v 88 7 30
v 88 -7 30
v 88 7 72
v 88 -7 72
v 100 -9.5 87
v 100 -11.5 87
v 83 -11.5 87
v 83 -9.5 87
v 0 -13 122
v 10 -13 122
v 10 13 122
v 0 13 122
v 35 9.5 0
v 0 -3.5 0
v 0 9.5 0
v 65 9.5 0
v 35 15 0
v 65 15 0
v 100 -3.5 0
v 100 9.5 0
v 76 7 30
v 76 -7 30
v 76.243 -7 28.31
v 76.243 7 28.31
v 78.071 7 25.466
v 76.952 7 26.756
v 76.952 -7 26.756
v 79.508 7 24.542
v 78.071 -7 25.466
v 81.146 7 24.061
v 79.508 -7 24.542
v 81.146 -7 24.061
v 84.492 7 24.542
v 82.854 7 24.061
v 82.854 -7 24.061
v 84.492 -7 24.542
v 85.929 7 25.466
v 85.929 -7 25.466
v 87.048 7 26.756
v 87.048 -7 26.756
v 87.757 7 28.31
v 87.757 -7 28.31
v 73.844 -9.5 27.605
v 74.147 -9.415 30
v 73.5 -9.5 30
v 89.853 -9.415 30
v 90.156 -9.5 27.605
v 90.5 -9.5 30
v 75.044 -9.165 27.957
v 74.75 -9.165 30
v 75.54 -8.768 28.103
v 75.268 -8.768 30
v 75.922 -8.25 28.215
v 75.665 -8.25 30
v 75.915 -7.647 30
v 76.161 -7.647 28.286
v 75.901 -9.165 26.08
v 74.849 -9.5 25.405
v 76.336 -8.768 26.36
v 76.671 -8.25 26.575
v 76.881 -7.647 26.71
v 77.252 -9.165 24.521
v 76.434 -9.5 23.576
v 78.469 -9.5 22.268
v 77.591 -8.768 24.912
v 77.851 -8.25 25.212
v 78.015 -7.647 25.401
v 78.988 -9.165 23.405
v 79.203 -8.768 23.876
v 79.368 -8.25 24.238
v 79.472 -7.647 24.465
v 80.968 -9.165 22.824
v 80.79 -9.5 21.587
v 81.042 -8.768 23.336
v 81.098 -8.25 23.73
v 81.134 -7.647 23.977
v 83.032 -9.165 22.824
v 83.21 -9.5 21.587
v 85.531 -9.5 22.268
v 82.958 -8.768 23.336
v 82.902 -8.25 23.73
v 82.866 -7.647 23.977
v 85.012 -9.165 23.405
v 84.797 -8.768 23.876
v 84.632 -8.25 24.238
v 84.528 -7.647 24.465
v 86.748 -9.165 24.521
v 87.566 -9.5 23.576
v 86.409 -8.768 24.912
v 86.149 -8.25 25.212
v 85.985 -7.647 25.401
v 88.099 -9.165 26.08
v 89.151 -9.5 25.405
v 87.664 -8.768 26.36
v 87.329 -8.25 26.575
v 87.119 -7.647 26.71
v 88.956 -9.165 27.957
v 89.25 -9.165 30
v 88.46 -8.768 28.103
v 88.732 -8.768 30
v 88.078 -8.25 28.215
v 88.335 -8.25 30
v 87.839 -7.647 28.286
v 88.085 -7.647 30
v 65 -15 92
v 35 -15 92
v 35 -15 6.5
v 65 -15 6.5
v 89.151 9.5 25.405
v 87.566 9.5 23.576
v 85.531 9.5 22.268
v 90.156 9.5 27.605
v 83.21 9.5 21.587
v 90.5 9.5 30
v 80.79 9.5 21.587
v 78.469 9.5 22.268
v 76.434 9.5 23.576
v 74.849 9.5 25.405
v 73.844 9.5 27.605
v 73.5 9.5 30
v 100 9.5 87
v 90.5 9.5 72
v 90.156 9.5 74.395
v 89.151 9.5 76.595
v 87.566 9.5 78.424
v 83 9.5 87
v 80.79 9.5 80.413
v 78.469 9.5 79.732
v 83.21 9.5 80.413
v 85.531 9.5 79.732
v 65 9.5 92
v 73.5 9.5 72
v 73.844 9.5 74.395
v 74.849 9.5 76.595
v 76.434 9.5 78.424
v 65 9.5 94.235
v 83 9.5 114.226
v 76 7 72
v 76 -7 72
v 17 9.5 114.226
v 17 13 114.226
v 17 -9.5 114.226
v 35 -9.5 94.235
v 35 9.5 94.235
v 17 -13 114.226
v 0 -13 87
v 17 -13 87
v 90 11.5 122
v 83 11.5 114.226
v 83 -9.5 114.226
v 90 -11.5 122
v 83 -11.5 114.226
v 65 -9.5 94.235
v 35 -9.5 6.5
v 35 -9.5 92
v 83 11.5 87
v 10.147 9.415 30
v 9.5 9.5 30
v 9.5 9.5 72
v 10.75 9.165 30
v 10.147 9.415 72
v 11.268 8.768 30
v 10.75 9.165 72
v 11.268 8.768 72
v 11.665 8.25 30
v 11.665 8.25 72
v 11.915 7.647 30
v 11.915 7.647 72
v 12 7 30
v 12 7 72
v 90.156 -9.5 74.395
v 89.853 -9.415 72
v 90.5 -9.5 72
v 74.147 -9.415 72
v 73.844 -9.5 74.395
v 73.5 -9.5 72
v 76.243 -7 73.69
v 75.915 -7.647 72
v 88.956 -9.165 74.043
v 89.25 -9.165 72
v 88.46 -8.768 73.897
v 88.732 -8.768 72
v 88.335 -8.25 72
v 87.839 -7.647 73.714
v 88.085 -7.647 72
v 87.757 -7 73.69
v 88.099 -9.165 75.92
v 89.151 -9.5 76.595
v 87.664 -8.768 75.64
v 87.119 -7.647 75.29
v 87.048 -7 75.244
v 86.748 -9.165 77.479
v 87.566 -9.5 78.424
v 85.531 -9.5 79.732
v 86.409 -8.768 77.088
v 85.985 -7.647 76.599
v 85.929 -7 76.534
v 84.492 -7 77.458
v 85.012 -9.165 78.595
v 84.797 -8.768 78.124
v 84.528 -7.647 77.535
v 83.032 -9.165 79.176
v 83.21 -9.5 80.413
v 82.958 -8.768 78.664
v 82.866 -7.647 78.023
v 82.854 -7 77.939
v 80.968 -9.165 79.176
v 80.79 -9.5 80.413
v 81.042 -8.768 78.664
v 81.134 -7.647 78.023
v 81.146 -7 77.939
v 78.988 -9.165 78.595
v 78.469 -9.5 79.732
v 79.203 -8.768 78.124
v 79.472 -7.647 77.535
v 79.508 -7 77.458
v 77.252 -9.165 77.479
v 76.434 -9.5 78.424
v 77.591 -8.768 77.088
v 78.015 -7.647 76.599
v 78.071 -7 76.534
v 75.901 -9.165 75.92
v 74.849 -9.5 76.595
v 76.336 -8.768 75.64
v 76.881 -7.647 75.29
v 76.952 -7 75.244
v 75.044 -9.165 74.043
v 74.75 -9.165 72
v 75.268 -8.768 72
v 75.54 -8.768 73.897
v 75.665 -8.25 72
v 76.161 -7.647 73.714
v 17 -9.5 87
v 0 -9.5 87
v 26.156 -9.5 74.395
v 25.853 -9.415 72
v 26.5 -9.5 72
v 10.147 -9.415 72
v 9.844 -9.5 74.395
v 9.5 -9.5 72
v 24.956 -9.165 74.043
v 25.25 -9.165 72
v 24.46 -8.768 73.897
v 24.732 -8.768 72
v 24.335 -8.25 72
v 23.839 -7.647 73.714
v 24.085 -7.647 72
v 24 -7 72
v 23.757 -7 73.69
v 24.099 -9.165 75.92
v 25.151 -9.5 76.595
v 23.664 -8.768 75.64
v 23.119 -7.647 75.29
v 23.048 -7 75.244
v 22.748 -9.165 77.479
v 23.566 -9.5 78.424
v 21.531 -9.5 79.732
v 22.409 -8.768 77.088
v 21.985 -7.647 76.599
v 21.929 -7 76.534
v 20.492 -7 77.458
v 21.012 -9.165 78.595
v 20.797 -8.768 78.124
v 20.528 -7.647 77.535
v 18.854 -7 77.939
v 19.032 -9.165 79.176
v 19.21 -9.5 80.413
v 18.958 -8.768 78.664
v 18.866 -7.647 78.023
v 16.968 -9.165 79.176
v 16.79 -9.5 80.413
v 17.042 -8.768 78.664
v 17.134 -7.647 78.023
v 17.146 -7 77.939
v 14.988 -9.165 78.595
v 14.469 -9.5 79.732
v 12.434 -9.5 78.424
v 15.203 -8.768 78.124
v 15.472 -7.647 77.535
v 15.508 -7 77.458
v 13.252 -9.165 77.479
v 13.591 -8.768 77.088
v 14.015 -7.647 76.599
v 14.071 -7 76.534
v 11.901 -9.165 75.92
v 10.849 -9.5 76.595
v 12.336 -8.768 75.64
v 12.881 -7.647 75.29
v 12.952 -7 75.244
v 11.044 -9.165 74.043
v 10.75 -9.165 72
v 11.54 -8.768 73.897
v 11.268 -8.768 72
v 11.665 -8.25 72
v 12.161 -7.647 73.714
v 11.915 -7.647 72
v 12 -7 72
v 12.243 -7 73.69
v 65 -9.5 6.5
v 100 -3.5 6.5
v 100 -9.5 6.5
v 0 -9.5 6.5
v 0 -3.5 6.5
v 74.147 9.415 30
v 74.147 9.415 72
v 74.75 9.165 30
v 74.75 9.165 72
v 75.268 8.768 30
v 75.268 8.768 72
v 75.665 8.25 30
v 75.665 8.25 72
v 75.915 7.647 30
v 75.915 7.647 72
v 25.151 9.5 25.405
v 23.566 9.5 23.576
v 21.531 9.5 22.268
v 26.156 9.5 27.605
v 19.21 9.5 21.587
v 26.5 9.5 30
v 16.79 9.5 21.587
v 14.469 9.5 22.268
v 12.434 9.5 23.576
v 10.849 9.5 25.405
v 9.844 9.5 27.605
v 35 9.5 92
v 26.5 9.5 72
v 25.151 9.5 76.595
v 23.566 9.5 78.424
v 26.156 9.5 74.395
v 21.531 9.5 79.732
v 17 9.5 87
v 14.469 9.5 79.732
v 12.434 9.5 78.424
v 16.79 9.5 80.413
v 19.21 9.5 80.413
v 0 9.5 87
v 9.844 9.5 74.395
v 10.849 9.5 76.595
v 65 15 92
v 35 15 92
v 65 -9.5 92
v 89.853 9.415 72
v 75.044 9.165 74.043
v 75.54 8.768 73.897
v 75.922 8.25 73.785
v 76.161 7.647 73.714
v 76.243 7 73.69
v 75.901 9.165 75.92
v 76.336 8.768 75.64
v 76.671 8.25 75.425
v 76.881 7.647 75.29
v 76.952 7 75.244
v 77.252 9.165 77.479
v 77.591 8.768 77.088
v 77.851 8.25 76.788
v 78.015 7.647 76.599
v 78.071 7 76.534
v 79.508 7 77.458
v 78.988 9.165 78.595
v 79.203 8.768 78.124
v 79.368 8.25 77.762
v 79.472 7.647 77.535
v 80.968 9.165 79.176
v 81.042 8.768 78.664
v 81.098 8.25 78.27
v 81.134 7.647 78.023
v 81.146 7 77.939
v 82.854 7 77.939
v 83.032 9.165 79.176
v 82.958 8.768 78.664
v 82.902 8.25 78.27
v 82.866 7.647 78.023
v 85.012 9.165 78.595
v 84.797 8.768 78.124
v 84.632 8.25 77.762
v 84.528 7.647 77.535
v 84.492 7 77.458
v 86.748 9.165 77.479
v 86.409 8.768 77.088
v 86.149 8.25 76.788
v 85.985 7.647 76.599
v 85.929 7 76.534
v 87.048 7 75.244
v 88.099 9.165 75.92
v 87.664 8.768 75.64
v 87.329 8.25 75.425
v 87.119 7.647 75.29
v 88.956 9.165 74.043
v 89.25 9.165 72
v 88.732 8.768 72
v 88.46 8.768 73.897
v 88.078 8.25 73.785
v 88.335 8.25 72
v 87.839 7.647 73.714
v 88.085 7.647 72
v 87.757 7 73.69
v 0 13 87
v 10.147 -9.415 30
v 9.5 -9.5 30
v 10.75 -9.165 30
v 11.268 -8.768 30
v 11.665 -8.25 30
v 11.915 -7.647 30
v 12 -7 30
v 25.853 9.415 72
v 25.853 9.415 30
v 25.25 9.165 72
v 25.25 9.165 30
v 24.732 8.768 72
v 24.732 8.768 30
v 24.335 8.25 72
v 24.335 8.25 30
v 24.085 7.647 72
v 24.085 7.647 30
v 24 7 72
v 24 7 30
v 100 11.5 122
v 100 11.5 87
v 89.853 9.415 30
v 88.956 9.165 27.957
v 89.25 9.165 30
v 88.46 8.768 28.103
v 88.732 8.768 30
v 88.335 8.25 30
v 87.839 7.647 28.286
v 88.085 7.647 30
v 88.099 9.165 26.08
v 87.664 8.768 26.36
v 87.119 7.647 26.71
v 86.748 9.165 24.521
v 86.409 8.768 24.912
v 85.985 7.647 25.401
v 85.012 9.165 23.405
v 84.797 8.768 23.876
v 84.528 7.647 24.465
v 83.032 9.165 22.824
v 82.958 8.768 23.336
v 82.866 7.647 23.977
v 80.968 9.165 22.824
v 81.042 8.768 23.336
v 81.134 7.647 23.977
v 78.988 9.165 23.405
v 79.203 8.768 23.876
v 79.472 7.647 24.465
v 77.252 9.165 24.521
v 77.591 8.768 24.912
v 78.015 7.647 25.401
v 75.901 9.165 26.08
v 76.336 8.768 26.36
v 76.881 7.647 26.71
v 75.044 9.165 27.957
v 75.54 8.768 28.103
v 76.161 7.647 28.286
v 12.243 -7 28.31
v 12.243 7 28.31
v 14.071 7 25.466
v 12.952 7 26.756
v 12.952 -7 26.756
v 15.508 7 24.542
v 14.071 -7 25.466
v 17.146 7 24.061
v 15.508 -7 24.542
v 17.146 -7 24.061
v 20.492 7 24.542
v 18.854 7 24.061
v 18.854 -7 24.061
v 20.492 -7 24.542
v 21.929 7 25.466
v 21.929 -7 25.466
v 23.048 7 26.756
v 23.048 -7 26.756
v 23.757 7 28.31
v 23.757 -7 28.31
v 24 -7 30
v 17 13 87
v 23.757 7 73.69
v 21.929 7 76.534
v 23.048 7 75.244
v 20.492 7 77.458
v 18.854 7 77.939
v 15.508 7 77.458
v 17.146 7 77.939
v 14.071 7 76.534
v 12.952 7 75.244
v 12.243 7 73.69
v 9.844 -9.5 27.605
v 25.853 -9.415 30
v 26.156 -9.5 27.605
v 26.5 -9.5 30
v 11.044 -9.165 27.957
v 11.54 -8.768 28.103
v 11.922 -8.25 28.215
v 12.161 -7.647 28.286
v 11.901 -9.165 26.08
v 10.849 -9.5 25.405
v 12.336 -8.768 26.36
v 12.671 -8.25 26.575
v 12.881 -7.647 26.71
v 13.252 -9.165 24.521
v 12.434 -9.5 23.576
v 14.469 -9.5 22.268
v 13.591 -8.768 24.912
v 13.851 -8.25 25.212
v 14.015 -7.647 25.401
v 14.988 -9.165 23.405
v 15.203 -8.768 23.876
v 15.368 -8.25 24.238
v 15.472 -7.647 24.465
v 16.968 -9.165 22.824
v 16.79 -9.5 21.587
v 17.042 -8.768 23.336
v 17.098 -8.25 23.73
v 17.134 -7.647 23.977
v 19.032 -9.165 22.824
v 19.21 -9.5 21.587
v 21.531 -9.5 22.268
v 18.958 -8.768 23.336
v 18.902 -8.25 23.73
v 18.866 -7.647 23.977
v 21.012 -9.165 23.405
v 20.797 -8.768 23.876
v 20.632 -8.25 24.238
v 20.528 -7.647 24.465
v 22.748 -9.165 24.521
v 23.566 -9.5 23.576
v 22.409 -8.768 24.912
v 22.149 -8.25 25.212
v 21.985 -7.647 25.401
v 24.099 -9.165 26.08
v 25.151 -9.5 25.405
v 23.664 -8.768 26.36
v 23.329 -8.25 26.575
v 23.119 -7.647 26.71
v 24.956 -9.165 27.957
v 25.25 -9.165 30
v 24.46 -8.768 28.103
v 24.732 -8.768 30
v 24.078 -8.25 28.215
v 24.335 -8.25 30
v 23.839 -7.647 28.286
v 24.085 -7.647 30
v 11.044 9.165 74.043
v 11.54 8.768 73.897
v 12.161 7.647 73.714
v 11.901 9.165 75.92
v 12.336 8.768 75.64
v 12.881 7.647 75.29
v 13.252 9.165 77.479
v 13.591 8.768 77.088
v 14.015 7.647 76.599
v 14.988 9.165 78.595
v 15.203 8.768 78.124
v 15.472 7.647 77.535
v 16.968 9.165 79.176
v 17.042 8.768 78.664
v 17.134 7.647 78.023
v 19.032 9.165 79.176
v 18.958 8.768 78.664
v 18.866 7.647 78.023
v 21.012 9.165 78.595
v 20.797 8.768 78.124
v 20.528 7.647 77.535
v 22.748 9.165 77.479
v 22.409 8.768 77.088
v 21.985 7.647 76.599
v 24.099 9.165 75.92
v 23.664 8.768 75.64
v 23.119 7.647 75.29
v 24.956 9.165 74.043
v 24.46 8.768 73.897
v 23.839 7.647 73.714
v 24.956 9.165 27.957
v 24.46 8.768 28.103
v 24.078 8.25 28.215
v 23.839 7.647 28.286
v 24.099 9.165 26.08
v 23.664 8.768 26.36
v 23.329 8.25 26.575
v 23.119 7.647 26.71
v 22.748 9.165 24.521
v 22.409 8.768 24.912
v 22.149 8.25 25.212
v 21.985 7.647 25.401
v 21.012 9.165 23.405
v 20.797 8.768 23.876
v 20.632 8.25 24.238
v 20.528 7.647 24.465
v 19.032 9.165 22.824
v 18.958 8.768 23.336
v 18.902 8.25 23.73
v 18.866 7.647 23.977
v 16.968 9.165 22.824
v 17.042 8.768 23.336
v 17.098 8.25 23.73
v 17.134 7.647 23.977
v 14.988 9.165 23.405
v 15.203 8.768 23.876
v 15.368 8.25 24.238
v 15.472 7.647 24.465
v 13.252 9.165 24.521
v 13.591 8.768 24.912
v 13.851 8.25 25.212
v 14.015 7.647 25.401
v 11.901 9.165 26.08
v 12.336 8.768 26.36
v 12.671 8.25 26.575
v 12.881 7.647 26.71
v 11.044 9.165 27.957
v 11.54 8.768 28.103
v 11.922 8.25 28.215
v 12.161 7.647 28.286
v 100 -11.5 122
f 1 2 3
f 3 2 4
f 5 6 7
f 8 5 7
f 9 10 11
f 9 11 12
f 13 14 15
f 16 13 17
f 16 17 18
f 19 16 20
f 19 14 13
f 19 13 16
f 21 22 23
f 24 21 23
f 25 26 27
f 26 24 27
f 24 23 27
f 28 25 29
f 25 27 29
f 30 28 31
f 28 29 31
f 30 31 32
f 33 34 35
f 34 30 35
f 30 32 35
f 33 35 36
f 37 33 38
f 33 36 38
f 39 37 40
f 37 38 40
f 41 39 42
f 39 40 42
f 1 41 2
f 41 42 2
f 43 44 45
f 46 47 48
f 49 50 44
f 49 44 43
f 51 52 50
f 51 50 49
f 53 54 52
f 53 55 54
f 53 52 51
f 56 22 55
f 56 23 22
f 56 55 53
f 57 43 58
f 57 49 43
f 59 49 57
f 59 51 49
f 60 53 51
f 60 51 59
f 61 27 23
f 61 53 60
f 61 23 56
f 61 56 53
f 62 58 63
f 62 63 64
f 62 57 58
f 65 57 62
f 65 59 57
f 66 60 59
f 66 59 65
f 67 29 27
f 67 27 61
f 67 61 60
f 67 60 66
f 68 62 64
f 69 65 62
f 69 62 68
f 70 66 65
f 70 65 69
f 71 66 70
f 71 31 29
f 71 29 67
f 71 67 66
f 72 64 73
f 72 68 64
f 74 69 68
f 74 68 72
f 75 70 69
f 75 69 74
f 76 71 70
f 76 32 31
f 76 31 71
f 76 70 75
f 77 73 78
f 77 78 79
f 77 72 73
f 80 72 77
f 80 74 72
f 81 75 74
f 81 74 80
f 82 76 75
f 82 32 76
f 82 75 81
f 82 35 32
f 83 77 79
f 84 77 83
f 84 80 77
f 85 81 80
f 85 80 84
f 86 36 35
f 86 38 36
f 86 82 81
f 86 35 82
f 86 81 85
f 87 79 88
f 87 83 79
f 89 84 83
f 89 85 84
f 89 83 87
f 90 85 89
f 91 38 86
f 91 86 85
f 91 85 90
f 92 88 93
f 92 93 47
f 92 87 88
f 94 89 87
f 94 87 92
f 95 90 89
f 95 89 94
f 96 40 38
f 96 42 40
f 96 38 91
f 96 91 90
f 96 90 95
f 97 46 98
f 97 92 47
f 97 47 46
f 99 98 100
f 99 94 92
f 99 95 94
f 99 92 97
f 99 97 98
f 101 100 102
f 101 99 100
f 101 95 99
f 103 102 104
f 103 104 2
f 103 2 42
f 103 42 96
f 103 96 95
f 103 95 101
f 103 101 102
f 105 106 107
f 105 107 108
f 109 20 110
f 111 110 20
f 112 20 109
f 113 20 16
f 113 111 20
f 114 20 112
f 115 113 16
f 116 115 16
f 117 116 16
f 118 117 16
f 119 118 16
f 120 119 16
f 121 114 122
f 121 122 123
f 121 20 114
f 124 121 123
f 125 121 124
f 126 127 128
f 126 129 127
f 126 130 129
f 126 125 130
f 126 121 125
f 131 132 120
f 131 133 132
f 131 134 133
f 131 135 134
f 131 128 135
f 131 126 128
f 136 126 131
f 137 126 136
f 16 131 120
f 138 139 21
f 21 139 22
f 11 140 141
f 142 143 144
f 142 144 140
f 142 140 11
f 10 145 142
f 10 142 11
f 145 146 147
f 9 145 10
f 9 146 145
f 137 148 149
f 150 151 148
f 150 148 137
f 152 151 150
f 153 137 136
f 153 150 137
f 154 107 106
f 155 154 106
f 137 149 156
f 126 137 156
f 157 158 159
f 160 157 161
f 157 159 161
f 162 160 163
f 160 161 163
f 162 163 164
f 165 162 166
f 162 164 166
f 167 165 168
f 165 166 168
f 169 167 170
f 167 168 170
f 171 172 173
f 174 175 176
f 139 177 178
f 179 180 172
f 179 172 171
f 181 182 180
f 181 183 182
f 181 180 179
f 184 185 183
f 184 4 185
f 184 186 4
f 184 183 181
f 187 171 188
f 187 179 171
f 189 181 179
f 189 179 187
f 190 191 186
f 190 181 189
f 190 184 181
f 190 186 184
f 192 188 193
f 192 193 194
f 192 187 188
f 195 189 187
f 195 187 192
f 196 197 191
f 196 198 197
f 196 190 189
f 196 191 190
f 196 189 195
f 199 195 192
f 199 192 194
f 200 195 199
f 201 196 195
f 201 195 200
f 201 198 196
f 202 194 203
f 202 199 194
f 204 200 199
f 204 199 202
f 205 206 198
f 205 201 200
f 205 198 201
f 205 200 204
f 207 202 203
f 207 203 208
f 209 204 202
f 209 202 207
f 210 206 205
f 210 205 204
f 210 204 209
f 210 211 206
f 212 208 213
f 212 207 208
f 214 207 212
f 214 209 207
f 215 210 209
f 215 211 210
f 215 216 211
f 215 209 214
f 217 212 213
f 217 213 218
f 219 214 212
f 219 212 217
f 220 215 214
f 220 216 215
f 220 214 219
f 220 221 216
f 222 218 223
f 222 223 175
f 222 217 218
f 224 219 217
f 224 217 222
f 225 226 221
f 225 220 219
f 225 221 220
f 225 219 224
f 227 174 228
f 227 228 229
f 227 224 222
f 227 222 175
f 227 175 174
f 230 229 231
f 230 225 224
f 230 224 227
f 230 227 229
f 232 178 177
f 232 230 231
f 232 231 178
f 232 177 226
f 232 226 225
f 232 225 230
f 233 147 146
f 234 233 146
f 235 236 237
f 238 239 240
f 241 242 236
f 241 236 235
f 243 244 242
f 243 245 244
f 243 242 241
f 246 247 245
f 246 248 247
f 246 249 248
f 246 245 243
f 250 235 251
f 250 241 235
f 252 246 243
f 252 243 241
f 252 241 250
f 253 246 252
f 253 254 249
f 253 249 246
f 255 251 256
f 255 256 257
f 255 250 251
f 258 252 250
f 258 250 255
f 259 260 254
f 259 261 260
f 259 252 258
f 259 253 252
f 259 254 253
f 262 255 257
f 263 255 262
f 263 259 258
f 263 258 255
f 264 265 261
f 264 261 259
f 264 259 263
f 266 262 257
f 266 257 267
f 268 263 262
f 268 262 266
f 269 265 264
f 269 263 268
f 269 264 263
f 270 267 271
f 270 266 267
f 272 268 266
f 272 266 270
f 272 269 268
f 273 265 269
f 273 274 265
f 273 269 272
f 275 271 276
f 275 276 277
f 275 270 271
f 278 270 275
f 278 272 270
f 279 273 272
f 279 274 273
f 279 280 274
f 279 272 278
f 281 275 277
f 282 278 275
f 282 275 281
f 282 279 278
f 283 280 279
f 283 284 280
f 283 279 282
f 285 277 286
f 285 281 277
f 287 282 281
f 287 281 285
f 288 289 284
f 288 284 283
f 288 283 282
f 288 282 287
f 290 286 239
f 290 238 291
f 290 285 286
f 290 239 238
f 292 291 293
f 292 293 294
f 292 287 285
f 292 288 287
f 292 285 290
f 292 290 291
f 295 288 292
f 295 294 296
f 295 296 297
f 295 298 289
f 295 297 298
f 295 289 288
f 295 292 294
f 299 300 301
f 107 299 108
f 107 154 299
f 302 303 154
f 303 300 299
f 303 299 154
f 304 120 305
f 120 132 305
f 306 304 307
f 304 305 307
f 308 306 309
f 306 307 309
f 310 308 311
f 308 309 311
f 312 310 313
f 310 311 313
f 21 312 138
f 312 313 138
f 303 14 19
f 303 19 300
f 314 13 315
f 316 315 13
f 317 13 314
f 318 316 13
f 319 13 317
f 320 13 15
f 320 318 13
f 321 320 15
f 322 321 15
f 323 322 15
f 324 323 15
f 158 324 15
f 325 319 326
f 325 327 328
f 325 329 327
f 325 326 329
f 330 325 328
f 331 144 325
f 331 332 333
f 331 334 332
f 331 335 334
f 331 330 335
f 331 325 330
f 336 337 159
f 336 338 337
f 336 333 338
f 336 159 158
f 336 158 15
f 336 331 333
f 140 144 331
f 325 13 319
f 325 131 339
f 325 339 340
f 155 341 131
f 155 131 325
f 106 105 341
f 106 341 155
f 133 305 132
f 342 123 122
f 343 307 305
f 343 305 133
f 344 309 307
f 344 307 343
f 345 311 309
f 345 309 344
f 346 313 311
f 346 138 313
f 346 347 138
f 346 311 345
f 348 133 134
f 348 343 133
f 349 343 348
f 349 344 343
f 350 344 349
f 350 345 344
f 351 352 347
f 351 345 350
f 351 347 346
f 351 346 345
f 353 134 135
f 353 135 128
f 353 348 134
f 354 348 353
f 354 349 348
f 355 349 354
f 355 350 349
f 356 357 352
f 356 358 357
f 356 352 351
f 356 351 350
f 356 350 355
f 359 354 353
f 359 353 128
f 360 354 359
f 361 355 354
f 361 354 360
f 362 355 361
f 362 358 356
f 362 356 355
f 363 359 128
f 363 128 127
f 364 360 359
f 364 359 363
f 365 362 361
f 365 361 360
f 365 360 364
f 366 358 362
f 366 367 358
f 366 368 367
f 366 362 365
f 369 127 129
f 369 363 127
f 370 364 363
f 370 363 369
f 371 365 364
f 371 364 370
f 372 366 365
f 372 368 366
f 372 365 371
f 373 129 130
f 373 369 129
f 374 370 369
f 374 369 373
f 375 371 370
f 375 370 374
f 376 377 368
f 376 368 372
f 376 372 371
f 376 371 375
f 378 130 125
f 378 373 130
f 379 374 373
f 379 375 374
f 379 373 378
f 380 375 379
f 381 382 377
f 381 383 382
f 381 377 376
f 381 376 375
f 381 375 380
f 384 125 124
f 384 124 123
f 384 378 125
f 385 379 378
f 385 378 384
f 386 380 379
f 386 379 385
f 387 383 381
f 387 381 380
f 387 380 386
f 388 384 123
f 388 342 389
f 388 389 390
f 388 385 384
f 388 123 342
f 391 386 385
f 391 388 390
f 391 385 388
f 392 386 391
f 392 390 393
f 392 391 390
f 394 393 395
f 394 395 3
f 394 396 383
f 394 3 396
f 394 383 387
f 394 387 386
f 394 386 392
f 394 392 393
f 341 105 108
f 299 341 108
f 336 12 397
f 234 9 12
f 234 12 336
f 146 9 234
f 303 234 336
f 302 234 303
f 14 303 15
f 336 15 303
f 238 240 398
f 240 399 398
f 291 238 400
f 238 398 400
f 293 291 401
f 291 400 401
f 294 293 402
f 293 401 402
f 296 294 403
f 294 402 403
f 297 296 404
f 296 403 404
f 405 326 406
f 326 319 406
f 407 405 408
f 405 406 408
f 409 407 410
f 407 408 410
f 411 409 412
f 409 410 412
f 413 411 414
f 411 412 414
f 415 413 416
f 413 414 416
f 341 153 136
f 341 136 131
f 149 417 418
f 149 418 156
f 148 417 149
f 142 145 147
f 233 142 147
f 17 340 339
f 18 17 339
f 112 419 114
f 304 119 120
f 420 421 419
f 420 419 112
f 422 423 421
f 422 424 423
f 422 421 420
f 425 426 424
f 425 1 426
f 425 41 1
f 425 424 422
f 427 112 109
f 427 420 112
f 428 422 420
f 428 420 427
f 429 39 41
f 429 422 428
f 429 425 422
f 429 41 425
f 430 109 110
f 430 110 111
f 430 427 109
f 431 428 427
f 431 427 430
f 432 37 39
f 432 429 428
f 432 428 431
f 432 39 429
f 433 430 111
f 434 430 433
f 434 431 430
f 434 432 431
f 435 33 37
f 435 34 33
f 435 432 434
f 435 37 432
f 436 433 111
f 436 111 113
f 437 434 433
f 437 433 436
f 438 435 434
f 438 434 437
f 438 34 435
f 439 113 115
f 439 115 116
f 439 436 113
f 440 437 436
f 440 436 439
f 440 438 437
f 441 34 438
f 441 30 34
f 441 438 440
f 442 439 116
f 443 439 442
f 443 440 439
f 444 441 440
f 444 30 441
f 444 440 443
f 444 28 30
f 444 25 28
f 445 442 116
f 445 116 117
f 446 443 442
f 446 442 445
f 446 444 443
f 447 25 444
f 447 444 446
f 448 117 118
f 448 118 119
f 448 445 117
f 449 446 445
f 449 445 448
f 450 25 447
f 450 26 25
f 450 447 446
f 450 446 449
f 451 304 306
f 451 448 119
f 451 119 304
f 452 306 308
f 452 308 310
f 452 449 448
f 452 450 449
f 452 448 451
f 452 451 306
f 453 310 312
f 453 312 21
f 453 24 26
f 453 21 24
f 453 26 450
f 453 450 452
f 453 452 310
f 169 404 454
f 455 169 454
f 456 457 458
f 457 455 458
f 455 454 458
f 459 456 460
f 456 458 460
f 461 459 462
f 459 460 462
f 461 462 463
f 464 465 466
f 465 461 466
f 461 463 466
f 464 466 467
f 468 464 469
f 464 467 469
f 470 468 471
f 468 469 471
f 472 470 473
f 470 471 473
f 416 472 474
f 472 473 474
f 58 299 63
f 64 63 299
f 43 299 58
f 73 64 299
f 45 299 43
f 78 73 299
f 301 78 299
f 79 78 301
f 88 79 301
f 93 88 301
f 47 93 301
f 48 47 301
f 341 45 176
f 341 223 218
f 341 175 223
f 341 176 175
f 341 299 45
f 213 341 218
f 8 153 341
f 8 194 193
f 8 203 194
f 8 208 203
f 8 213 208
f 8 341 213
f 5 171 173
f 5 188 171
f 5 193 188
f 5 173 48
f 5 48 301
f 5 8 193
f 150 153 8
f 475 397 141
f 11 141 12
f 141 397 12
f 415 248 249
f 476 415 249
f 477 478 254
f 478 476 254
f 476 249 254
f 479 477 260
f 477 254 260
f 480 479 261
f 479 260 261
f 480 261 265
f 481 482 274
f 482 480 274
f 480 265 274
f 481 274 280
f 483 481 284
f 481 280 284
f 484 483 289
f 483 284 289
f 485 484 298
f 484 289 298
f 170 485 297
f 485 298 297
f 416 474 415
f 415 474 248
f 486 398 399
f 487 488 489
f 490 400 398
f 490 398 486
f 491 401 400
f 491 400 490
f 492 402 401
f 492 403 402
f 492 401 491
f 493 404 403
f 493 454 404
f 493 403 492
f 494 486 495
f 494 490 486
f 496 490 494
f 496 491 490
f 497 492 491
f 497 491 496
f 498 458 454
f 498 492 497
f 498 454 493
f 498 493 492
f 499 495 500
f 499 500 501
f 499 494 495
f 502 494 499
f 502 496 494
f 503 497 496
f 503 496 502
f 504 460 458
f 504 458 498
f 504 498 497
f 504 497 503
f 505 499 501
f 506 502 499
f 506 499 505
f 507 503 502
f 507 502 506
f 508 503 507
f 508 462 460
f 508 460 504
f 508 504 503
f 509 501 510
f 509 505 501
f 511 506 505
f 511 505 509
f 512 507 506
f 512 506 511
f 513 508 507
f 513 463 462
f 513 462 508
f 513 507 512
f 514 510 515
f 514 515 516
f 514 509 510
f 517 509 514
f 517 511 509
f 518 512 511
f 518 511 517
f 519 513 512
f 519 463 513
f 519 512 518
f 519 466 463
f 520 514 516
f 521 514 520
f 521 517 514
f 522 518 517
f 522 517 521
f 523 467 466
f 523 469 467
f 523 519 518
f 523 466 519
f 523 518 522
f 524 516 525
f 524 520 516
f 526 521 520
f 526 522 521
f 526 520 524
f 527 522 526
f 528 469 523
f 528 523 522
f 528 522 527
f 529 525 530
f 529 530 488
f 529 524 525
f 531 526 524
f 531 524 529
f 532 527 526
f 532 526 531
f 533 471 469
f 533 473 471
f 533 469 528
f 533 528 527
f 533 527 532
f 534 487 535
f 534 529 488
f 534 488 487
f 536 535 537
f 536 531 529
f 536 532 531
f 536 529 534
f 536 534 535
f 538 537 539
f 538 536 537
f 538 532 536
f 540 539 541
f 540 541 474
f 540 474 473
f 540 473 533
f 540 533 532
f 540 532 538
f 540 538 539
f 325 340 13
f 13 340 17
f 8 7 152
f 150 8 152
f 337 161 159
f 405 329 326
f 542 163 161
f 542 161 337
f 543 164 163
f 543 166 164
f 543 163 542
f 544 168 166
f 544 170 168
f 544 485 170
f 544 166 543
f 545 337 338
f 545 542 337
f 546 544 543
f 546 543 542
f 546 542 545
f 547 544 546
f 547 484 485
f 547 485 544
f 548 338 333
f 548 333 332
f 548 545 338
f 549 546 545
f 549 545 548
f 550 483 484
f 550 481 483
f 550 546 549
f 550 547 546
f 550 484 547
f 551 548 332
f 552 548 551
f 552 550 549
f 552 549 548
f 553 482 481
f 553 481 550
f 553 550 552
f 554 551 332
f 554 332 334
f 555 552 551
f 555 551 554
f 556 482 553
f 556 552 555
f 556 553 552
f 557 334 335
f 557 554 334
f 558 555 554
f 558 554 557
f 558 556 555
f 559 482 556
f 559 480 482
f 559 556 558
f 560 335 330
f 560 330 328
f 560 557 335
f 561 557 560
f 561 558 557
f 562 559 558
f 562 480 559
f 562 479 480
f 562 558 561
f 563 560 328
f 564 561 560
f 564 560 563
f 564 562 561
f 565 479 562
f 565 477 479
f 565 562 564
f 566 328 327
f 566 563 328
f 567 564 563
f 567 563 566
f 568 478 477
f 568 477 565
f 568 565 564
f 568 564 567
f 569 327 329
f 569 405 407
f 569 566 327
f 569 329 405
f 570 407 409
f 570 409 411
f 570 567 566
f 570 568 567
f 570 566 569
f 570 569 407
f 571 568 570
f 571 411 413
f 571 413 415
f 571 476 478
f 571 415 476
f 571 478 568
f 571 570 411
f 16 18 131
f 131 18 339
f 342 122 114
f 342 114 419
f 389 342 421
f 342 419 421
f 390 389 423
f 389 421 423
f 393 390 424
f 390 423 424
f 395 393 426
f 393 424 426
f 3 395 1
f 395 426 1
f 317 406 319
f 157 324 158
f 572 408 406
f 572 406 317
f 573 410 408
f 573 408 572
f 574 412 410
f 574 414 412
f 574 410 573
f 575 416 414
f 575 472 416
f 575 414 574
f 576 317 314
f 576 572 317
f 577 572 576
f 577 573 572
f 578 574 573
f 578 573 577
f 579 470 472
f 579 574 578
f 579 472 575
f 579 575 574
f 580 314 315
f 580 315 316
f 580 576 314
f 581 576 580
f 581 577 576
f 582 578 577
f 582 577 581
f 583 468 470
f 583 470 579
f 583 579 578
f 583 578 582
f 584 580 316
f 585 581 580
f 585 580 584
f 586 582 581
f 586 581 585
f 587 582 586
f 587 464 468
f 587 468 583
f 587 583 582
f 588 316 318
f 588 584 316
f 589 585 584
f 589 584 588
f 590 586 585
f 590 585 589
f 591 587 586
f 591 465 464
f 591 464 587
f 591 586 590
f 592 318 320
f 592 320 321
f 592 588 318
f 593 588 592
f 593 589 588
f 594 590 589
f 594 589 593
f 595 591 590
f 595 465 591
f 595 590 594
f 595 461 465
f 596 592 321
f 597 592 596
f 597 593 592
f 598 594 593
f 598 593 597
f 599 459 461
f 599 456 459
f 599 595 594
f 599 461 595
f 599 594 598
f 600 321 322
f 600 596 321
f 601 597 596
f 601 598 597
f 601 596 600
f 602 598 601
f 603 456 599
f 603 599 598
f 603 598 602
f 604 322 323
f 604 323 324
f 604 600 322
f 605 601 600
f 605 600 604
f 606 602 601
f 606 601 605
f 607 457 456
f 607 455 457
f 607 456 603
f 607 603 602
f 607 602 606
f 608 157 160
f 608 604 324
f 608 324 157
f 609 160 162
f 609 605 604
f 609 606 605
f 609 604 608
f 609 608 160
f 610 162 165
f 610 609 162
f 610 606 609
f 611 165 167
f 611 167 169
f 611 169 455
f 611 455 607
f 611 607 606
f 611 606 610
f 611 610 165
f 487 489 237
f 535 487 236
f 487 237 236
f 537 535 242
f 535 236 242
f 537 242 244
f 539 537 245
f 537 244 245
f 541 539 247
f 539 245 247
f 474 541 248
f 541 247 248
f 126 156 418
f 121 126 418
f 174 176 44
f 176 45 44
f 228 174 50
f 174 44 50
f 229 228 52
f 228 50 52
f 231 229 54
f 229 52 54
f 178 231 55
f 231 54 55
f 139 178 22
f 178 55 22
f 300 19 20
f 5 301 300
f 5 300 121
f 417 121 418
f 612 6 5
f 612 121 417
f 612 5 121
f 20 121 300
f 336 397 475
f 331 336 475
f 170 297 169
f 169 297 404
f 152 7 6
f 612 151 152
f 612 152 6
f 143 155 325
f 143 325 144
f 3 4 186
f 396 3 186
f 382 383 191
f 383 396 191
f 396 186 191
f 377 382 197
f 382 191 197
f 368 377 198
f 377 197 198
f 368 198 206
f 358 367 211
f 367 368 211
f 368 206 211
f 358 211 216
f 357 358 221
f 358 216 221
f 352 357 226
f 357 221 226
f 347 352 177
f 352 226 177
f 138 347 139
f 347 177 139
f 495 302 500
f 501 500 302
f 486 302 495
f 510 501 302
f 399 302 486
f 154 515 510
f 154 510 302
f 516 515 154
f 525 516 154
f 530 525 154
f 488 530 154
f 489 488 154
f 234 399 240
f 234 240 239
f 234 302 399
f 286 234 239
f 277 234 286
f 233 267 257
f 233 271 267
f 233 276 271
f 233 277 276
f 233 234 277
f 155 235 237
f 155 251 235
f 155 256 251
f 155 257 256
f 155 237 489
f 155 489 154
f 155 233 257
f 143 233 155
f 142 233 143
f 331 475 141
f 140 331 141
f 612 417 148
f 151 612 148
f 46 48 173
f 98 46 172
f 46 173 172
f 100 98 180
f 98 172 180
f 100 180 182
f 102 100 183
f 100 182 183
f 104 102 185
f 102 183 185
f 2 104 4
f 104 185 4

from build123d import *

# Parameters (mm, degrees)
F1_DEPTH  = 15
F3_W      = 11.5
F3_H      = 6.5
F4_DEPTH  = 100
F6_DEPTH  = 5.5
F8_DEPTH  = 3.5
F10_DEPTH = 5.5
F12_DEPTH = 3.5
F14_DEPTH = 25
F15_R     = 2.5
F16_W     = 20.5905072875
F16_H     = 35
F16_W_2   = 2
F17_DEPTH = 17


with BuildPart() as f1:
    # F0 (on Front) → F1 (new body, symmetric)
    with BuildSketch(Plane.XZ):
        Polygon((0, 122), (0, 0), (100, 0), (100, 122), (90, 122), (65, 94.2346871293), (65, 92), (35, 92), (35, 94.2346871293), (10, 122), align=None)
    extrude(amount=F1_DEPTH, both=True)

    # F3 (on face) → F4 (cut)
    with BuildSketch(Plane(origin=(0, 0, 0), x_dir=(0, -1, 0), z_dir=(-1, 0, 0))):
        with Locations((9.25, 3.25)):
            Rectangle(F3_W, F3_H)
    extrude(amount=-F4_DEPTH, mode=Mode.SUBTRACT)

    # F5 (on face) → F6 (cut)
    with BuildSketch(Plane.XZ.offset(15)):
        Polygon((17, 87), (0, 87), (0, 6.5), (35, 6.5), (35, 92), (35, 94.2346871293), (17, 114.2257123962), align=None)
        Polygon((65, 94.2346871293), (65, 92), (65, 6.5), (100, 6.5), (100, 87), (83, 87), (83, 114.2257123962), align=None)
    extrude(amount=-F6_DEPTH, mode=Mode.SUBTRACT)

    # F7 (on face) → F8 (cut)
    with BuildSketch(Plane.XZ.offset(15)):
        Polygon((100, 122), (90, 122), (83, 114.2257123962), (83, 87), (100, 87), align=None)
    extrude(amount=-F8_DEPTH, mode=Mode.SUBTRACT)

    # F9 (on face) → F10 (cut)
    with BuildSketch(Plane(origin=(0, 15, 0), x_dir=(-1, 0, 0), z_dir=(0, 1, 0))):
        Polygon((-17, 87), (-17, 114.2257123962), (-35, 94.2346871293), (-35, 92), (-35, 0), (0, 0), (0, 87), align=None)
        Polygon((-65, 92), (-65, 94.2346871293), (-83, 114.2257123962), (-83, 87), (-100, 87), (-100, 0), (-65, 0), align=None)
    extrude(amount=-F10_DEPTH, mode=Mode.SUBTRACT)

    # F11 (on face) → F12 (cut)
    with BuildSketch(Plane(origin=(0, 15, 0), x_dir=(-1, 0, 0), z_dir=(0, 1, 0))):
        Polygon((-90, 122), (-100, 122), (-100, 87), (-83, 87), (-83, 114.2257123962), align=None)
    extrude(amount=-F12_DEPTH, mode=Mode.SUBTRACT)

    # F13 (on face) → F14 (cut)
    with BuildSketch(Plane.XZ.offset(15)):
        with BuildLine():
            Line((24, 30), (24, 72))
            ThreePointArc((24, 72), (18, 78), (12, 72))
            Line((12, 72), (12, 30))
            ThreePointArc((12, 30), (18, 24), (24, 30))
        make_face()
        with BuildLine():
            ThreePointArc((88, 72), (82, 78), (76, 72))
            Line((76, 72), (76, 30))
            ThreePointArc((76, 30), (82, 24), (88, 30))
            Line((88, 30), (88, 72))
        make_face()
    extrude(amount=-F14_DEPTH, mode=Mode.SUBTRACT)

    # F15
    f15_edges = [f1.edges().sort_by_distance(p)[0] for p in [
        (76, 9.5, 51),
        (24, 9.5, 51),
        (12, -9.5, 51),
        (76, -9.5, 51),
    ]]
    fillet(f15_edges, radius=F15_R)

    # F16 (on face) → F17 (cut)
    with BuildSketch(Plane(origin=(0, 0, 0), x_dir=(0, -1, 0), z_dir=(-1, 0, 0))):
        with Locations((-25.2952536438, 104.5)):
            Rectangle(F16_W, F16_H)
        with Locations((25.2952536438, 104.5)):
            Rectangle(F16_W, F16_H)
        with Locations((-14, 104.5)):
            Rectangle(F16_W_2, F16_H)
        with Locations((14, 104.5)):
            Rectangle(F16_W_2, F16_H)
    extrude(amount=-F17_DEPTH, mode=Mode.SUBTRACT)


solid = f1.part
